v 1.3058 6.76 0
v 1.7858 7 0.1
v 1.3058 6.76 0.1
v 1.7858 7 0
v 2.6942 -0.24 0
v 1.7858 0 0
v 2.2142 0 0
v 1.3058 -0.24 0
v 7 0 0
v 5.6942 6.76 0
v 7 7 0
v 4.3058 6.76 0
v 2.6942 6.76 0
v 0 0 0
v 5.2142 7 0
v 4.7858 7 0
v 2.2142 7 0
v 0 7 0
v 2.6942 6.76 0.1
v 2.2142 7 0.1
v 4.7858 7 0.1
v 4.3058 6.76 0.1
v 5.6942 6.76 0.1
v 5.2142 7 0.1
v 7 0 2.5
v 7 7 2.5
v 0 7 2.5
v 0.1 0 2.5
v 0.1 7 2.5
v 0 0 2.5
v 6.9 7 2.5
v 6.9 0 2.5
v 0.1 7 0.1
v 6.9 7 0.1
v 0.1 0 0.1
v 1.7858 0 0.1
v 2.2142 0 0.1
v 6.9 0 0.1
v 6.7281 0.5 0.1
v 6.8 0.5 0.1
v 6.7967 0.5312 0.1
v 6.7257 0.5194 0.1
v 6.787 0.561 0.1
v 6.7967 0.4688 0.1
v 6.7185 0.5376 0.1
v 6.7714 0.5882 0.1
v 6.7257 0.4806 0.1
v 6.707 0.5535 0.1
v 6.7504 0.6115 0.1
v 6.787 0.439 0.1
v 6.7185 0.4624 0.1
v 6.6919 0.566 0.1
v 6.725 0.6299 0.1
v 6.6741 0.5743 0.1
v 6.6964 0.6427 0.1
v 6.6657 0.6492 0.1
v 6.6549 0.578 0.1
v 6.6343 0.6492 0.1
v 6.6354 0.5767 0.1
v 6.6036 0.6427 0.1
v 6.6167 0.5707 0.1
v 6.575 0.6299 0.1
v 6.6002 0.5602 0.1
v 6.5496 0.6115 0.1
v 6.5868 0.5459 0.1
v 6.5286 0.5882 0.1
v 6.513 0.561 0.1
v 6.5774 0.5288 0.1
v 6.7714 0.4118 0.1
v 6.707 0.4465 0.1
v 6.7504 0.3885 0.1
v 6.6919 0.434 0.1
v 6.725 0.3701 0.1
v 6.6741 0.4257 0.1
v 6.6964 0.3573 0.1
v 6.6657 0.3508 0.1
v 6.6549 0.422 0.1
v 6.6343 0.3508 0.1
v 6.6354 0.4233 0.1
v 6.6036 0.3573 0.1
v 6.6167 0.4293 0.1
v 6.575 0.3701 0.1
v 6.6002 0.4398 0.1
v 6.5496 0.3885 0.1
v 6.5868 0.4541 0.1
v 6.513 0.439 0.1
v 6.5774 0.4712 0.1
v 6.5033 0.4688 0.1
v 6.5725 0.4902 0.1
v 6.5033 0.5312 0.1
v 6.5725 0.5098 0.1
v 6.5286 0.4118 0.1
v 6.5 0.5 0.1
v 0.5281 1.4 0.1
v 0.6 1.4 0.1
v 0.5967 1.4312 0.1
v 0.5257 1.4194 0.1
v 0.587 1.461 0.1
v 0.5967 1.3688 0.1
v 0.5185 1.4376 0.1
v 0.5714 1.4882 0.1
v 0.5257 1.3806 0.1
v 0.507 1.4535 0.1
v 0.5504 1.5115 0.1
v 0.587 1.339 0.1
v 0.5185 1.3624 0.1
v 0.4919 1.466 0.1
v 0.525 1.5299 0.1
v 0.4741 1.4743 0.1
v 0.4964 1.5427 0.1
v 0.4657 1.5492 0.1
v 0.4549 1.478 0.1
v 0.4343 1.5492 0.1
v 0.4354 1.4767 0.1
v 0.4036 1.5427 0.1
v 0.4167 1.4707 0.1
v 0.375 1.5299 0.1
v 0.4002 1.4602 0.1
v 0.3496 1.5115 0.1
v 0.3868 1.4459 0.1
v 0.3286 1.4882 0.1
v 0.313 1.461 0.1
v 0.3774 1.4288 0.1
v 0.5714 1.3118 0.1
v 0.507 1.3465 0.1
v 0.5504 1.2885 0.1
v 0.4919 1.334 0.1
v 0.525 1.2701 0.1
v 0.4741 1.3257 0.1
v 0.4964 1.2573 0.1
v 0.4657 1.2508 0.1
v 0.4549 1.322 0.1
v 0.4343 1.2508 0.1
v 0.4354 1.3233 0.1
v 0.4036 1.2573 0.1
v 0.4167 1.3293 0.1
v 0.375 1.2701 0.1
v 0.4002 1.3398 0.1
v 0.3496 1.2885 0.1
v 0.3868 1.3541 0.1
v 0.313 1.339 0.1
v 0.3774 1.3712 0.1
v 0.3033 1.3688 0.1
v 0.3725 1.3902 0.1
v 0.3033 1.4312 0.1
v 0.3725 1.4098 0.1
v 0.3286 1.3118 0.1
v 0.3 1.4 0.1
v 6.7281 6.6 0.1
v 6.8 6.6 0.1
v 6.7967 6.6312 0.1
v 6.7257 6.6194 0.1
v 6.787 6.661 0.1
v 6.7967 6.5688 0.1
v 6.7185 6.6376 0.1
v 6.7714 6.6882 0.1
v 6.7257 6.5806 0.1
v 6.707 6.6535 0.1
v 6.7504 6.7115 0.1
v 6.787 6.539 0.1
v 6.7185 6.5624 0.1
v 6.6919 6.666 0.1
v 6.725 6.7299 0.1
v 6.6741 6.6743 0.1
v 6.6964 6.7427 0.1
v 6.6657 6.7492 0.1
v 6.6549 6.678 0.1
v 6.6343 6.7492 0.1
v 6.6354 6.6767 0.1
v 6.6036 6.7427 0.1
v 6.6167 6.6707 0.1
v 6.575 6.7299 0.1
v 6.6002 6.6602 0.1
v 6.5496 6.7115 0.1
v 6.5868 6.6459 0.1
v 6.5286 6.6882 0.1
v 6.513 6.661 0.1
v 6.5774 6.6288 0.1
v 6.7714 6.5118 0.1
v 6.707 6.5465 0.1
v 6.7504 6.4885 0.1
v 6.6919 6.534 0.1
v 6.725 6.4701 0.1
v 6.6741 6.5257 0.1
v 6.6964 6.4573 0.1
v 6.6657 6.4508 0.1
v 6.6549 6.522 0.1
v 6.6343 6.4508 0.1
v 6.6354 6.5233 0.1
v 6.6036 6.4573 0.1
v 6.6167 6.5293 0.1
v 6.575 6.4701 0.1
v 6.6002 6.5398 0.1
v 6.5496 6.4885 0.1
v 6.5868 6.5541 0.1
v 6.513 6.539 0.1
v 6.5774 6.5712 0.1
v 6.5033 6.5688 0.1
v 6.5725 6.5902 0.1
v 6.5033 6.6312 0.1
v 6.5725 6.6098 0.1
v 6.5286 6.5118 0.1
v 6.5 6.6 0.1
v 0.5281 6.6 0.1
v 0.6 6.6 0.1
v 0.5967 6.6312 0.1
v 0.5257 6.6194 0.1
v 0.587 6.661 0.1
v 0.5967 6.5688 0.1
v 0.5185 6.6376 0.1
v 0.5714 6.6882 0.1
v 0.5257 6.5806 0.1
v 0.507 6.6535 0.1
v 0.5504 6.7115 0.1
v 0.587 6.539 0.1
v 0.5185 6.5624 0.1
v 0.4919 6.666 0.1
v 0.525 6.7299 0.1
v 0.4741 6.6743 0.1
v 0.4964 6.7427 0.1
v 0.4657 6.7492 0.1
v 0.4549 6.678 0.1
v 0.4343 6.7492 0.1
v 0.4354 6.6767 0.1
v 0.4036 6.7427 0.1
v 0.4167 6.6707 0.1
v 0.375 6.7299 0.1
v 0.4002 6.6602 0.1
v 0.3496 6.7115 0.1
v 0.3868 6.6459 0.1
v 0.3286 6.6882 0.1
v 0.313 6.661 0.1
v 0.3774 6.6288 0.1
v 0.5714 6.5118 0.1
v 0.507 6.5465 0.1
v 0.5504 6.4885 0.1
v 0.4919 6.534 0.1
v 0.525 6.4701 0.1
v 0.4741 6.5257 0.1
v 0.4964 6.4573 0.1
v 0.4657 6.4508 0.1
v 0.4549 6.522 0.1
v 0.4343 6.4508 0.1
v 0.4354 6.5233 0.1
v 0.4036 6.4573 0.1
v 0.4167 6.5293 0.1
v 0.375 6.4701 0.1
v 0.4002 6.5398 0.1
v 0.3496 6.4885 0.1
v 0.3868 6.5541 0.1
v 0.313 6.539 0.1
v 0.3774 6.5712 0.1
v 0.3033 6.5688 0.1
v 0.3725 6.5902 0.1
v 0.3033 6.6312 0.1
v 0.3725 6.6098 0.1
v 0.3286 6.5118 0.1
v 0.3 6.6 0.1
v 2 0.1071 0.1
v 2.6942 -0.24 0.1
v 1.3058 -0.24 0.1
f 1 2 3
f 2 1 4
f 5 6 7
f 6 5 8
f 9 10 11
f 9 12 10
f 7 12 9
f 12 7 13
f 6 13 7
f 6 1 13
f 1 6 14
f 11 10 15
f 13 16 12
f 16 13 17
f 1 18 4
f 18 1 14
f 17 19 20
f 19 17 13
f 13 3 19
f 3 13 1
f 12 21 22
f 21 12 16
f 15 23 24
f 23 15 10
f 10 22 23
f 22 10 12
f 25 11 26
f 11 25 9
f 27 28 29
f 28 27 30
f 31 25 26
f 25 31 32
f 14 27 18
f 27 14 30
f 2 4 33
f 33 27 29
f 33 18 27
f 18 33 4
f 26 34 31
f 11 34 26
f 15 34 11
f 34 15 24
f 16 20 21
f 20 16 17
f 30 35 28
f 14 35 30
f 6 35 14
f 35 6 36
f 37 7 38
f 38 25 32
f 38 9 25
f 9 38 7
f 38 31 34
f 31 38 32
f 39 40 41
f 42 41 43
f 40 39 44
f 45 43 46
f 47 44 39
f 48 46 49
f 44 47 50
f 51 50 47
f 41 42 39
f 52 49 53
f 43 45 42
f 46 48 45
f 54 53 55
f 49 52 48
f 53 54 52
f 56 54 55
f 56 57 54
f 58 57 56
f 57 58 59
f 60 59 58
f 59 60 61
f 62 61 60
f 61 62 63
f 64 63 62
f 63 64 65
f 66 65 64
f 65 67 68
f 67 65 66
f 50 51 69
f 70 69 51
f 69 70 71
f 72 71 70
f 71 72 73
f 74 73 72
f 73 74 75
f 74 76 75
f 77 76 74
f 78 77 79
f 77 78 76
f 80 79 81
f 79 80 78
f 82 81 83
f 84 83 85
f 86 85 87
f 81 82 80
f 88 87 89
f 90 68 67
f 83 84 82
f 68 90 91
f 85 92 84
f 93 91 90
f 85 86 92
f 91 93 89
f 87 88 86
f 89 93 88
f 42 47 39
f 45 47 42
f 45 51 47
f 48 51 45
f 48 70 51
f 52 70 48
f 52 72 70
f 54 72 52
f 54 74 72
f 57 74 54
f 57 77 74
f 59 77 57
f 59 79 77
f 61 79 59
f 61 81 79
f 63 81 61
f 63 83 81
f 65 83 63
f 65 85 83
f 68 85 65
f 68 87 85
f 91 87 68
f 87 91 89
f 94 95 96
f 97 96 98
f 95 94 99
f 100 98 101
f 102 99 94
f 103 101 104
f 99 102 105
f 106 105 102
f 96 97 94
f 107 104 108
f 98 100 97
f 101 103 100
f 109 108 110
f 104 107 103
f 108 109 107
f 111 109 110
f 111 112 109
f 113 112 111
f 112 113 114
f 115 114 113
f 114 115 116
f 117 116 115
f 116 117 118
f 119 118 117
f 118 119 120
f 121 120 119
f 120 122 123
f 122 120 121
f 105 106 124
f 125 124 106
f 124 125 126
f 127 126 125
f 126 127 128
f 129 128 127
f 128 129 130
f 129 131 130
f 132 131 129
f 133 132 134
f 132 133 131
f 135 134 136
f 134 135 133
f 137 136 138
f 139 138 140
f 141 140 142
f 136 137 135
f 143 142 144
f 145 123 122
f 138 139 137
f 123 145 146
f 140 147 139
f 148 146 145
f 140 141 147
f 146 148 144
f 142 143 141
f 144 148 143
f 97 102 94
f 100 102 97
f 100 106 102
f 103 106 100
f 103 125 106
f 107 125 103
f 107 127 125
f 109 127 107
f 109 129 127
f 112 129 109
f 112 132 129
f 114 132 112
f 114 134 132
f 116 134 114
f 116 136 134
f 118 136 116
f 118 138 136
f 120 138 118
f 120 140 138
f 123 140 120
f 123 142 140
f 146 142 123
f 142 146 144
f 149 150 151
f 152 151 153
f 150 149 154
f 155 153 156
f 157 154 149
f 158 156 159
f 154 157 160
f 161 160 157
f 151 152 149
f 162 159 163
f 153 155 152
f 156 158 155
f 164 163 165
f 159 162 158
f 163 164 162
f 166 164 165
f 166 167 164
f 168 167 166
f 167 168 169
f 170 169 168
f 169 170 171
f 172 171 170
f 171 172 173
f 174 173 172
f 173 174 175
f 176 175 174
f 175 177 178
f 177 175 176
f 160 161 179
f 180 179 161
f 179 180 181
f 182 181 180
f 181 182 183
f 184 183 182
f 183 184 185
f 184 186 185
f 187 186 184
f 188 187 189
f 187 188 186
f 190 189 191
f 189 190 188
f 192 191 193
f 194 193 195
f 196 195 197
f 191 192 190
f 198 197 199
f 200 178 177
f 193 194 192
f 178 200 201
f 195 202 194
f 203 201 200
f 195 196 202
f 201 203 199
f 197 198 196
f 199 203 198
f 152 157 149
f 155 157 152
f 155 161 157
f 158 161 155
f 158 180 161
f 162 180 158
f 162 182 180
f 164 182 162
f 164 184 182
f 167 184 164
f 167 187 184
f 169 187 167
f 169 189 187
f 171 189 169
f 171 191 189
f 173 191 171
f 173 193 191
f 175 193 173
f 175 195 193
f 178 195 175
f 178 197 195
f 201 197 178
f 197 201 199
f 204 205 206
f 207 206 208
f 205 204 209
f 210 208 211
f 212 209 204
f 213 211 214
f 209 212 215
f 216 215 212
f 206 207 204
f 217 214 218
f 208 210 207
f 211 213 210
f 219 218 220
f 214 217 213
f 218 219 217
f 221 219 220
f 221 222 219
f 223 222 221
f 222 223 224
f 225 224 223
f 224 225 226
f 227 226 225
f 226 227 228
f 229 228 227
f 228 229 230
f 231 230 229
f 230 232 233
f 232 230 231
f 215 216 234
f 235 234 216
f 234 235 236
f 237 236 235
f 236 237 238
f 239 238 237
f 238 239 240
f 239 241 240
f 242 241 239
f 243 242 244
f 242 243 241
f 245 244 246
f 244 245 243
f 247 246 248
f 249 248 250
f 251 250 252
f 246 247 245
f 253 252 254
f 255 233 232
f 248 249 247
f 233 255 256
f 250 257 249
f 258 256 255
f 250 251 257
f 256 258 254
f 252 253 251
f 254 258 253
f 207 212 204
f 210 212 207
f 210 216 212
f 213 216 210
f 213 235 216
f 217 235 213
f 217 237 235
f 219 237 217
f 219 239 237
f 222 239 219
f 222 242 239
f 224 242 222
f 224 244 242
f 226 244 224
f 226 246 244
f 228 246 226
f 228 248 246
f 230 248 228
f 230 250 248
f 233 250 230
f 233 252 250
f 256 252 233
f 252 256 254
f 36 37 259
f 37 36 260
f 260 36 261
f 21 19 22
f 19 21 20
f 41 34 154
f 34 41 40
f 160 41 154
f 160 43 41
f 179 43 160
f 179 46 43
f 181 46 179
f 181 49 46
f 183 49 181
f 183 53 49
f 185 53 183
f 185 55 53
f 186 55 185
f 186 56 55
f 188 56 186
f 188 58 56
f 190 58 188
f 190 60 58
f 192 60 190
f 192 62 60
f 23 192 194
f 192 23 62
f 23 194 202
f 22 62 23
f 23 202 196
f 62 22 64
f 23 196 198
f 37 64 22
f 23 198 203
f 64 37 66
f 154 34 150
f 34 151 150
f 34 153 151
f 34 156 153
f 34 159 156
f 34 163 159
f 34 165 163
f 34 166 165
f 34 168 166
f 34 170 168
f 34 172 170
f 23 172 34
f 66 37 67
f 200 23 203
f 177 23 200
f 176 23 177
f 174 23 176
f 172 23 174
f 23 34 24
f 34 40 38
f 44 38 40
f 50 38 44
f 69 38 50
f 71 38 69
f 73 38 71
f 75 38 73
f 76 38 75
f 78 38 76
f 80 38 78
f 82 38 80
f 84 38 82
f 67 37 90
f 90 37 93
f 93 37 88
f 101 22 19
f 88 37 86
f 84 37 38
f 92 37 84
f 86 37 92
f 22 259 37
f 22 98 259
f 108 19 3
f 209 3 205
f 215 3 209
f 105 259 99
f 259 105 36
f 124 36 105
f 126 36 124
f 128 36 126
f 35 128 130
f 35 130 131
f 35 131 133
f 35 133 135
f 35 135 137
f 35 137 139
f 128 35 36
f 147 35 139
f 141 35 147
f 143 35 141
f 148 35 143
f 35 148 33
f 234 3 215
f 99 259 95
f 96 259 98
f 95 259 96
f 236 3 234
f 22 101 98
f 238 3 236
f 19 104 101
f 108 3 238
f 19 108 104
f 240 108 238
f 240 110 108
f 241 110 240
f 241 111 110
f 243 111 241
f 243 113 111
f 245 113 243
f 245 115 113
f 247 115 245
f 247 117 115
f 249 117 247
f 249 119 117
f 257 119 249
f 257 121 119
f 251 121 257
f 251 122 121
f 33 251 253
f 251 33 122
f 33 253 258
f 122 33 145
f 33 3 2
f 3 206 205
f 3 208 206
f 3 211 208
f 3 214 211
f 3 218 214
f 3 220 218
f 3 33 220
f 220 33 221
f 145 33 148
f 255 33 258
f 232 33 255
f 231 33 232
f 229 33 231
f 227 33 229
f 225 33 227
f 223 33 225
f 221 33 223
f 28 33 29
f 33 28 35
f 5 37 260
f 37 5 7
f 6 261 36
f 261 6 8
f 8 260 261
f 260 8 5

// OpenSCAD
//MAIN CASE

difference(){
cube([7,7,2.5]); //base box

translate([.1,0,.1]){
cube([6.8,7.1,4]);} //cut out box

difference(){

translate([2,6.4,0]){
scale([2,1,1]){
rotate(a=45, v=[0,0,1]){
cube([.5,.5,.5]);}}} //cut out attachment points

translate([1.25,4.76,0]){
cube([2,2,1]);}
}

difference(){

translate([5,6.4,0]){
scale([2,1,1]){
rotate(a=45, v=[0,0,1]){
cube([.5,.5,.5]);}}} //cut out attachment points

translate([4.25,4.76,0]){
cube([2,2,1]);}
}

//translate([.1,0,0.2]){
//cube([6.2,.2,1.75]);} //FACEPLATE IO SHIELD

} //end difference


//SCREW LOCATIONS
screwLocationExterior = 15;
screwLocationInterior = 2.5/32*100;
screwLocationHeight = 0.25;
screwLocation1 = [6.65,.5,0.1];
screwLocation2 = [0.45,1.4,0.1];
screwLocation3 = [6.65,6.6,0.1];
screwLocation4 = [0.45,6.6,0.1];

difference(){

translate(screwLocation1){
scale([0.01,0.01,0]){
cylinder(h=screwLocationHeight, r=screwLocationExterior);}}

translate(screwLocation1){
scale([0.01,0.01,0]){
cylinder(h=screwLocationHeight, r=screwLocationInterior);}}

} //end difference

difference(){

translate(screwLocation2){
scale([0.01,0.01,0]){
cylinder(h=screwLocationHeight, r=screwLocationExterior);}}

translate(screwLocation2){
scale([0.01,0.01,0]){
cylinder(h=screwLocationHeight, r=screwLocationInterior);}}

} //end difference

difference(){

translate(screwLocation3){
scale([0.01,0.01,0]){
cylinder(h=screwLocationHeight, r=screwLocationExterior);}}

translate(screwLocation3){
scale([0.01,0.01,0]){
cylinder(h=screwLocationHeight, r=screwLocationInterior);}}

} //end difference

difference(){

translate(screwLocation4){
scale([0.01,0.01,0]){
cylinder(h=screwLocationHeight, r=screwLocationExterior);}}

translate(screwLocation4){
scale([0.01,0.01,0]){
cylinder(h=screwLocationHeight, r=screwLocationInterior);}}

} //end difference


//ADD FRONT ATTACMENT POINTS

difference(){

translate([2,-0.6,0]){
scale([2,1,1]){
rotate(a=45, v=[0,0,1]){
cube([.5,.5,.1]);}}} //cut out attachment points

translate([1.25,-2.24,0]){
cube([2,2,1]);}
}

difference(){

translate([5,-56.9,0]){
scale([2,1,1]){
rotate(a=45, v=[0,0,1]){
cube([.5,.5,.1]);}}} //cut out attachment points

translate([4.25,-56.9,0]){
cube([2,2,1]);}
}
